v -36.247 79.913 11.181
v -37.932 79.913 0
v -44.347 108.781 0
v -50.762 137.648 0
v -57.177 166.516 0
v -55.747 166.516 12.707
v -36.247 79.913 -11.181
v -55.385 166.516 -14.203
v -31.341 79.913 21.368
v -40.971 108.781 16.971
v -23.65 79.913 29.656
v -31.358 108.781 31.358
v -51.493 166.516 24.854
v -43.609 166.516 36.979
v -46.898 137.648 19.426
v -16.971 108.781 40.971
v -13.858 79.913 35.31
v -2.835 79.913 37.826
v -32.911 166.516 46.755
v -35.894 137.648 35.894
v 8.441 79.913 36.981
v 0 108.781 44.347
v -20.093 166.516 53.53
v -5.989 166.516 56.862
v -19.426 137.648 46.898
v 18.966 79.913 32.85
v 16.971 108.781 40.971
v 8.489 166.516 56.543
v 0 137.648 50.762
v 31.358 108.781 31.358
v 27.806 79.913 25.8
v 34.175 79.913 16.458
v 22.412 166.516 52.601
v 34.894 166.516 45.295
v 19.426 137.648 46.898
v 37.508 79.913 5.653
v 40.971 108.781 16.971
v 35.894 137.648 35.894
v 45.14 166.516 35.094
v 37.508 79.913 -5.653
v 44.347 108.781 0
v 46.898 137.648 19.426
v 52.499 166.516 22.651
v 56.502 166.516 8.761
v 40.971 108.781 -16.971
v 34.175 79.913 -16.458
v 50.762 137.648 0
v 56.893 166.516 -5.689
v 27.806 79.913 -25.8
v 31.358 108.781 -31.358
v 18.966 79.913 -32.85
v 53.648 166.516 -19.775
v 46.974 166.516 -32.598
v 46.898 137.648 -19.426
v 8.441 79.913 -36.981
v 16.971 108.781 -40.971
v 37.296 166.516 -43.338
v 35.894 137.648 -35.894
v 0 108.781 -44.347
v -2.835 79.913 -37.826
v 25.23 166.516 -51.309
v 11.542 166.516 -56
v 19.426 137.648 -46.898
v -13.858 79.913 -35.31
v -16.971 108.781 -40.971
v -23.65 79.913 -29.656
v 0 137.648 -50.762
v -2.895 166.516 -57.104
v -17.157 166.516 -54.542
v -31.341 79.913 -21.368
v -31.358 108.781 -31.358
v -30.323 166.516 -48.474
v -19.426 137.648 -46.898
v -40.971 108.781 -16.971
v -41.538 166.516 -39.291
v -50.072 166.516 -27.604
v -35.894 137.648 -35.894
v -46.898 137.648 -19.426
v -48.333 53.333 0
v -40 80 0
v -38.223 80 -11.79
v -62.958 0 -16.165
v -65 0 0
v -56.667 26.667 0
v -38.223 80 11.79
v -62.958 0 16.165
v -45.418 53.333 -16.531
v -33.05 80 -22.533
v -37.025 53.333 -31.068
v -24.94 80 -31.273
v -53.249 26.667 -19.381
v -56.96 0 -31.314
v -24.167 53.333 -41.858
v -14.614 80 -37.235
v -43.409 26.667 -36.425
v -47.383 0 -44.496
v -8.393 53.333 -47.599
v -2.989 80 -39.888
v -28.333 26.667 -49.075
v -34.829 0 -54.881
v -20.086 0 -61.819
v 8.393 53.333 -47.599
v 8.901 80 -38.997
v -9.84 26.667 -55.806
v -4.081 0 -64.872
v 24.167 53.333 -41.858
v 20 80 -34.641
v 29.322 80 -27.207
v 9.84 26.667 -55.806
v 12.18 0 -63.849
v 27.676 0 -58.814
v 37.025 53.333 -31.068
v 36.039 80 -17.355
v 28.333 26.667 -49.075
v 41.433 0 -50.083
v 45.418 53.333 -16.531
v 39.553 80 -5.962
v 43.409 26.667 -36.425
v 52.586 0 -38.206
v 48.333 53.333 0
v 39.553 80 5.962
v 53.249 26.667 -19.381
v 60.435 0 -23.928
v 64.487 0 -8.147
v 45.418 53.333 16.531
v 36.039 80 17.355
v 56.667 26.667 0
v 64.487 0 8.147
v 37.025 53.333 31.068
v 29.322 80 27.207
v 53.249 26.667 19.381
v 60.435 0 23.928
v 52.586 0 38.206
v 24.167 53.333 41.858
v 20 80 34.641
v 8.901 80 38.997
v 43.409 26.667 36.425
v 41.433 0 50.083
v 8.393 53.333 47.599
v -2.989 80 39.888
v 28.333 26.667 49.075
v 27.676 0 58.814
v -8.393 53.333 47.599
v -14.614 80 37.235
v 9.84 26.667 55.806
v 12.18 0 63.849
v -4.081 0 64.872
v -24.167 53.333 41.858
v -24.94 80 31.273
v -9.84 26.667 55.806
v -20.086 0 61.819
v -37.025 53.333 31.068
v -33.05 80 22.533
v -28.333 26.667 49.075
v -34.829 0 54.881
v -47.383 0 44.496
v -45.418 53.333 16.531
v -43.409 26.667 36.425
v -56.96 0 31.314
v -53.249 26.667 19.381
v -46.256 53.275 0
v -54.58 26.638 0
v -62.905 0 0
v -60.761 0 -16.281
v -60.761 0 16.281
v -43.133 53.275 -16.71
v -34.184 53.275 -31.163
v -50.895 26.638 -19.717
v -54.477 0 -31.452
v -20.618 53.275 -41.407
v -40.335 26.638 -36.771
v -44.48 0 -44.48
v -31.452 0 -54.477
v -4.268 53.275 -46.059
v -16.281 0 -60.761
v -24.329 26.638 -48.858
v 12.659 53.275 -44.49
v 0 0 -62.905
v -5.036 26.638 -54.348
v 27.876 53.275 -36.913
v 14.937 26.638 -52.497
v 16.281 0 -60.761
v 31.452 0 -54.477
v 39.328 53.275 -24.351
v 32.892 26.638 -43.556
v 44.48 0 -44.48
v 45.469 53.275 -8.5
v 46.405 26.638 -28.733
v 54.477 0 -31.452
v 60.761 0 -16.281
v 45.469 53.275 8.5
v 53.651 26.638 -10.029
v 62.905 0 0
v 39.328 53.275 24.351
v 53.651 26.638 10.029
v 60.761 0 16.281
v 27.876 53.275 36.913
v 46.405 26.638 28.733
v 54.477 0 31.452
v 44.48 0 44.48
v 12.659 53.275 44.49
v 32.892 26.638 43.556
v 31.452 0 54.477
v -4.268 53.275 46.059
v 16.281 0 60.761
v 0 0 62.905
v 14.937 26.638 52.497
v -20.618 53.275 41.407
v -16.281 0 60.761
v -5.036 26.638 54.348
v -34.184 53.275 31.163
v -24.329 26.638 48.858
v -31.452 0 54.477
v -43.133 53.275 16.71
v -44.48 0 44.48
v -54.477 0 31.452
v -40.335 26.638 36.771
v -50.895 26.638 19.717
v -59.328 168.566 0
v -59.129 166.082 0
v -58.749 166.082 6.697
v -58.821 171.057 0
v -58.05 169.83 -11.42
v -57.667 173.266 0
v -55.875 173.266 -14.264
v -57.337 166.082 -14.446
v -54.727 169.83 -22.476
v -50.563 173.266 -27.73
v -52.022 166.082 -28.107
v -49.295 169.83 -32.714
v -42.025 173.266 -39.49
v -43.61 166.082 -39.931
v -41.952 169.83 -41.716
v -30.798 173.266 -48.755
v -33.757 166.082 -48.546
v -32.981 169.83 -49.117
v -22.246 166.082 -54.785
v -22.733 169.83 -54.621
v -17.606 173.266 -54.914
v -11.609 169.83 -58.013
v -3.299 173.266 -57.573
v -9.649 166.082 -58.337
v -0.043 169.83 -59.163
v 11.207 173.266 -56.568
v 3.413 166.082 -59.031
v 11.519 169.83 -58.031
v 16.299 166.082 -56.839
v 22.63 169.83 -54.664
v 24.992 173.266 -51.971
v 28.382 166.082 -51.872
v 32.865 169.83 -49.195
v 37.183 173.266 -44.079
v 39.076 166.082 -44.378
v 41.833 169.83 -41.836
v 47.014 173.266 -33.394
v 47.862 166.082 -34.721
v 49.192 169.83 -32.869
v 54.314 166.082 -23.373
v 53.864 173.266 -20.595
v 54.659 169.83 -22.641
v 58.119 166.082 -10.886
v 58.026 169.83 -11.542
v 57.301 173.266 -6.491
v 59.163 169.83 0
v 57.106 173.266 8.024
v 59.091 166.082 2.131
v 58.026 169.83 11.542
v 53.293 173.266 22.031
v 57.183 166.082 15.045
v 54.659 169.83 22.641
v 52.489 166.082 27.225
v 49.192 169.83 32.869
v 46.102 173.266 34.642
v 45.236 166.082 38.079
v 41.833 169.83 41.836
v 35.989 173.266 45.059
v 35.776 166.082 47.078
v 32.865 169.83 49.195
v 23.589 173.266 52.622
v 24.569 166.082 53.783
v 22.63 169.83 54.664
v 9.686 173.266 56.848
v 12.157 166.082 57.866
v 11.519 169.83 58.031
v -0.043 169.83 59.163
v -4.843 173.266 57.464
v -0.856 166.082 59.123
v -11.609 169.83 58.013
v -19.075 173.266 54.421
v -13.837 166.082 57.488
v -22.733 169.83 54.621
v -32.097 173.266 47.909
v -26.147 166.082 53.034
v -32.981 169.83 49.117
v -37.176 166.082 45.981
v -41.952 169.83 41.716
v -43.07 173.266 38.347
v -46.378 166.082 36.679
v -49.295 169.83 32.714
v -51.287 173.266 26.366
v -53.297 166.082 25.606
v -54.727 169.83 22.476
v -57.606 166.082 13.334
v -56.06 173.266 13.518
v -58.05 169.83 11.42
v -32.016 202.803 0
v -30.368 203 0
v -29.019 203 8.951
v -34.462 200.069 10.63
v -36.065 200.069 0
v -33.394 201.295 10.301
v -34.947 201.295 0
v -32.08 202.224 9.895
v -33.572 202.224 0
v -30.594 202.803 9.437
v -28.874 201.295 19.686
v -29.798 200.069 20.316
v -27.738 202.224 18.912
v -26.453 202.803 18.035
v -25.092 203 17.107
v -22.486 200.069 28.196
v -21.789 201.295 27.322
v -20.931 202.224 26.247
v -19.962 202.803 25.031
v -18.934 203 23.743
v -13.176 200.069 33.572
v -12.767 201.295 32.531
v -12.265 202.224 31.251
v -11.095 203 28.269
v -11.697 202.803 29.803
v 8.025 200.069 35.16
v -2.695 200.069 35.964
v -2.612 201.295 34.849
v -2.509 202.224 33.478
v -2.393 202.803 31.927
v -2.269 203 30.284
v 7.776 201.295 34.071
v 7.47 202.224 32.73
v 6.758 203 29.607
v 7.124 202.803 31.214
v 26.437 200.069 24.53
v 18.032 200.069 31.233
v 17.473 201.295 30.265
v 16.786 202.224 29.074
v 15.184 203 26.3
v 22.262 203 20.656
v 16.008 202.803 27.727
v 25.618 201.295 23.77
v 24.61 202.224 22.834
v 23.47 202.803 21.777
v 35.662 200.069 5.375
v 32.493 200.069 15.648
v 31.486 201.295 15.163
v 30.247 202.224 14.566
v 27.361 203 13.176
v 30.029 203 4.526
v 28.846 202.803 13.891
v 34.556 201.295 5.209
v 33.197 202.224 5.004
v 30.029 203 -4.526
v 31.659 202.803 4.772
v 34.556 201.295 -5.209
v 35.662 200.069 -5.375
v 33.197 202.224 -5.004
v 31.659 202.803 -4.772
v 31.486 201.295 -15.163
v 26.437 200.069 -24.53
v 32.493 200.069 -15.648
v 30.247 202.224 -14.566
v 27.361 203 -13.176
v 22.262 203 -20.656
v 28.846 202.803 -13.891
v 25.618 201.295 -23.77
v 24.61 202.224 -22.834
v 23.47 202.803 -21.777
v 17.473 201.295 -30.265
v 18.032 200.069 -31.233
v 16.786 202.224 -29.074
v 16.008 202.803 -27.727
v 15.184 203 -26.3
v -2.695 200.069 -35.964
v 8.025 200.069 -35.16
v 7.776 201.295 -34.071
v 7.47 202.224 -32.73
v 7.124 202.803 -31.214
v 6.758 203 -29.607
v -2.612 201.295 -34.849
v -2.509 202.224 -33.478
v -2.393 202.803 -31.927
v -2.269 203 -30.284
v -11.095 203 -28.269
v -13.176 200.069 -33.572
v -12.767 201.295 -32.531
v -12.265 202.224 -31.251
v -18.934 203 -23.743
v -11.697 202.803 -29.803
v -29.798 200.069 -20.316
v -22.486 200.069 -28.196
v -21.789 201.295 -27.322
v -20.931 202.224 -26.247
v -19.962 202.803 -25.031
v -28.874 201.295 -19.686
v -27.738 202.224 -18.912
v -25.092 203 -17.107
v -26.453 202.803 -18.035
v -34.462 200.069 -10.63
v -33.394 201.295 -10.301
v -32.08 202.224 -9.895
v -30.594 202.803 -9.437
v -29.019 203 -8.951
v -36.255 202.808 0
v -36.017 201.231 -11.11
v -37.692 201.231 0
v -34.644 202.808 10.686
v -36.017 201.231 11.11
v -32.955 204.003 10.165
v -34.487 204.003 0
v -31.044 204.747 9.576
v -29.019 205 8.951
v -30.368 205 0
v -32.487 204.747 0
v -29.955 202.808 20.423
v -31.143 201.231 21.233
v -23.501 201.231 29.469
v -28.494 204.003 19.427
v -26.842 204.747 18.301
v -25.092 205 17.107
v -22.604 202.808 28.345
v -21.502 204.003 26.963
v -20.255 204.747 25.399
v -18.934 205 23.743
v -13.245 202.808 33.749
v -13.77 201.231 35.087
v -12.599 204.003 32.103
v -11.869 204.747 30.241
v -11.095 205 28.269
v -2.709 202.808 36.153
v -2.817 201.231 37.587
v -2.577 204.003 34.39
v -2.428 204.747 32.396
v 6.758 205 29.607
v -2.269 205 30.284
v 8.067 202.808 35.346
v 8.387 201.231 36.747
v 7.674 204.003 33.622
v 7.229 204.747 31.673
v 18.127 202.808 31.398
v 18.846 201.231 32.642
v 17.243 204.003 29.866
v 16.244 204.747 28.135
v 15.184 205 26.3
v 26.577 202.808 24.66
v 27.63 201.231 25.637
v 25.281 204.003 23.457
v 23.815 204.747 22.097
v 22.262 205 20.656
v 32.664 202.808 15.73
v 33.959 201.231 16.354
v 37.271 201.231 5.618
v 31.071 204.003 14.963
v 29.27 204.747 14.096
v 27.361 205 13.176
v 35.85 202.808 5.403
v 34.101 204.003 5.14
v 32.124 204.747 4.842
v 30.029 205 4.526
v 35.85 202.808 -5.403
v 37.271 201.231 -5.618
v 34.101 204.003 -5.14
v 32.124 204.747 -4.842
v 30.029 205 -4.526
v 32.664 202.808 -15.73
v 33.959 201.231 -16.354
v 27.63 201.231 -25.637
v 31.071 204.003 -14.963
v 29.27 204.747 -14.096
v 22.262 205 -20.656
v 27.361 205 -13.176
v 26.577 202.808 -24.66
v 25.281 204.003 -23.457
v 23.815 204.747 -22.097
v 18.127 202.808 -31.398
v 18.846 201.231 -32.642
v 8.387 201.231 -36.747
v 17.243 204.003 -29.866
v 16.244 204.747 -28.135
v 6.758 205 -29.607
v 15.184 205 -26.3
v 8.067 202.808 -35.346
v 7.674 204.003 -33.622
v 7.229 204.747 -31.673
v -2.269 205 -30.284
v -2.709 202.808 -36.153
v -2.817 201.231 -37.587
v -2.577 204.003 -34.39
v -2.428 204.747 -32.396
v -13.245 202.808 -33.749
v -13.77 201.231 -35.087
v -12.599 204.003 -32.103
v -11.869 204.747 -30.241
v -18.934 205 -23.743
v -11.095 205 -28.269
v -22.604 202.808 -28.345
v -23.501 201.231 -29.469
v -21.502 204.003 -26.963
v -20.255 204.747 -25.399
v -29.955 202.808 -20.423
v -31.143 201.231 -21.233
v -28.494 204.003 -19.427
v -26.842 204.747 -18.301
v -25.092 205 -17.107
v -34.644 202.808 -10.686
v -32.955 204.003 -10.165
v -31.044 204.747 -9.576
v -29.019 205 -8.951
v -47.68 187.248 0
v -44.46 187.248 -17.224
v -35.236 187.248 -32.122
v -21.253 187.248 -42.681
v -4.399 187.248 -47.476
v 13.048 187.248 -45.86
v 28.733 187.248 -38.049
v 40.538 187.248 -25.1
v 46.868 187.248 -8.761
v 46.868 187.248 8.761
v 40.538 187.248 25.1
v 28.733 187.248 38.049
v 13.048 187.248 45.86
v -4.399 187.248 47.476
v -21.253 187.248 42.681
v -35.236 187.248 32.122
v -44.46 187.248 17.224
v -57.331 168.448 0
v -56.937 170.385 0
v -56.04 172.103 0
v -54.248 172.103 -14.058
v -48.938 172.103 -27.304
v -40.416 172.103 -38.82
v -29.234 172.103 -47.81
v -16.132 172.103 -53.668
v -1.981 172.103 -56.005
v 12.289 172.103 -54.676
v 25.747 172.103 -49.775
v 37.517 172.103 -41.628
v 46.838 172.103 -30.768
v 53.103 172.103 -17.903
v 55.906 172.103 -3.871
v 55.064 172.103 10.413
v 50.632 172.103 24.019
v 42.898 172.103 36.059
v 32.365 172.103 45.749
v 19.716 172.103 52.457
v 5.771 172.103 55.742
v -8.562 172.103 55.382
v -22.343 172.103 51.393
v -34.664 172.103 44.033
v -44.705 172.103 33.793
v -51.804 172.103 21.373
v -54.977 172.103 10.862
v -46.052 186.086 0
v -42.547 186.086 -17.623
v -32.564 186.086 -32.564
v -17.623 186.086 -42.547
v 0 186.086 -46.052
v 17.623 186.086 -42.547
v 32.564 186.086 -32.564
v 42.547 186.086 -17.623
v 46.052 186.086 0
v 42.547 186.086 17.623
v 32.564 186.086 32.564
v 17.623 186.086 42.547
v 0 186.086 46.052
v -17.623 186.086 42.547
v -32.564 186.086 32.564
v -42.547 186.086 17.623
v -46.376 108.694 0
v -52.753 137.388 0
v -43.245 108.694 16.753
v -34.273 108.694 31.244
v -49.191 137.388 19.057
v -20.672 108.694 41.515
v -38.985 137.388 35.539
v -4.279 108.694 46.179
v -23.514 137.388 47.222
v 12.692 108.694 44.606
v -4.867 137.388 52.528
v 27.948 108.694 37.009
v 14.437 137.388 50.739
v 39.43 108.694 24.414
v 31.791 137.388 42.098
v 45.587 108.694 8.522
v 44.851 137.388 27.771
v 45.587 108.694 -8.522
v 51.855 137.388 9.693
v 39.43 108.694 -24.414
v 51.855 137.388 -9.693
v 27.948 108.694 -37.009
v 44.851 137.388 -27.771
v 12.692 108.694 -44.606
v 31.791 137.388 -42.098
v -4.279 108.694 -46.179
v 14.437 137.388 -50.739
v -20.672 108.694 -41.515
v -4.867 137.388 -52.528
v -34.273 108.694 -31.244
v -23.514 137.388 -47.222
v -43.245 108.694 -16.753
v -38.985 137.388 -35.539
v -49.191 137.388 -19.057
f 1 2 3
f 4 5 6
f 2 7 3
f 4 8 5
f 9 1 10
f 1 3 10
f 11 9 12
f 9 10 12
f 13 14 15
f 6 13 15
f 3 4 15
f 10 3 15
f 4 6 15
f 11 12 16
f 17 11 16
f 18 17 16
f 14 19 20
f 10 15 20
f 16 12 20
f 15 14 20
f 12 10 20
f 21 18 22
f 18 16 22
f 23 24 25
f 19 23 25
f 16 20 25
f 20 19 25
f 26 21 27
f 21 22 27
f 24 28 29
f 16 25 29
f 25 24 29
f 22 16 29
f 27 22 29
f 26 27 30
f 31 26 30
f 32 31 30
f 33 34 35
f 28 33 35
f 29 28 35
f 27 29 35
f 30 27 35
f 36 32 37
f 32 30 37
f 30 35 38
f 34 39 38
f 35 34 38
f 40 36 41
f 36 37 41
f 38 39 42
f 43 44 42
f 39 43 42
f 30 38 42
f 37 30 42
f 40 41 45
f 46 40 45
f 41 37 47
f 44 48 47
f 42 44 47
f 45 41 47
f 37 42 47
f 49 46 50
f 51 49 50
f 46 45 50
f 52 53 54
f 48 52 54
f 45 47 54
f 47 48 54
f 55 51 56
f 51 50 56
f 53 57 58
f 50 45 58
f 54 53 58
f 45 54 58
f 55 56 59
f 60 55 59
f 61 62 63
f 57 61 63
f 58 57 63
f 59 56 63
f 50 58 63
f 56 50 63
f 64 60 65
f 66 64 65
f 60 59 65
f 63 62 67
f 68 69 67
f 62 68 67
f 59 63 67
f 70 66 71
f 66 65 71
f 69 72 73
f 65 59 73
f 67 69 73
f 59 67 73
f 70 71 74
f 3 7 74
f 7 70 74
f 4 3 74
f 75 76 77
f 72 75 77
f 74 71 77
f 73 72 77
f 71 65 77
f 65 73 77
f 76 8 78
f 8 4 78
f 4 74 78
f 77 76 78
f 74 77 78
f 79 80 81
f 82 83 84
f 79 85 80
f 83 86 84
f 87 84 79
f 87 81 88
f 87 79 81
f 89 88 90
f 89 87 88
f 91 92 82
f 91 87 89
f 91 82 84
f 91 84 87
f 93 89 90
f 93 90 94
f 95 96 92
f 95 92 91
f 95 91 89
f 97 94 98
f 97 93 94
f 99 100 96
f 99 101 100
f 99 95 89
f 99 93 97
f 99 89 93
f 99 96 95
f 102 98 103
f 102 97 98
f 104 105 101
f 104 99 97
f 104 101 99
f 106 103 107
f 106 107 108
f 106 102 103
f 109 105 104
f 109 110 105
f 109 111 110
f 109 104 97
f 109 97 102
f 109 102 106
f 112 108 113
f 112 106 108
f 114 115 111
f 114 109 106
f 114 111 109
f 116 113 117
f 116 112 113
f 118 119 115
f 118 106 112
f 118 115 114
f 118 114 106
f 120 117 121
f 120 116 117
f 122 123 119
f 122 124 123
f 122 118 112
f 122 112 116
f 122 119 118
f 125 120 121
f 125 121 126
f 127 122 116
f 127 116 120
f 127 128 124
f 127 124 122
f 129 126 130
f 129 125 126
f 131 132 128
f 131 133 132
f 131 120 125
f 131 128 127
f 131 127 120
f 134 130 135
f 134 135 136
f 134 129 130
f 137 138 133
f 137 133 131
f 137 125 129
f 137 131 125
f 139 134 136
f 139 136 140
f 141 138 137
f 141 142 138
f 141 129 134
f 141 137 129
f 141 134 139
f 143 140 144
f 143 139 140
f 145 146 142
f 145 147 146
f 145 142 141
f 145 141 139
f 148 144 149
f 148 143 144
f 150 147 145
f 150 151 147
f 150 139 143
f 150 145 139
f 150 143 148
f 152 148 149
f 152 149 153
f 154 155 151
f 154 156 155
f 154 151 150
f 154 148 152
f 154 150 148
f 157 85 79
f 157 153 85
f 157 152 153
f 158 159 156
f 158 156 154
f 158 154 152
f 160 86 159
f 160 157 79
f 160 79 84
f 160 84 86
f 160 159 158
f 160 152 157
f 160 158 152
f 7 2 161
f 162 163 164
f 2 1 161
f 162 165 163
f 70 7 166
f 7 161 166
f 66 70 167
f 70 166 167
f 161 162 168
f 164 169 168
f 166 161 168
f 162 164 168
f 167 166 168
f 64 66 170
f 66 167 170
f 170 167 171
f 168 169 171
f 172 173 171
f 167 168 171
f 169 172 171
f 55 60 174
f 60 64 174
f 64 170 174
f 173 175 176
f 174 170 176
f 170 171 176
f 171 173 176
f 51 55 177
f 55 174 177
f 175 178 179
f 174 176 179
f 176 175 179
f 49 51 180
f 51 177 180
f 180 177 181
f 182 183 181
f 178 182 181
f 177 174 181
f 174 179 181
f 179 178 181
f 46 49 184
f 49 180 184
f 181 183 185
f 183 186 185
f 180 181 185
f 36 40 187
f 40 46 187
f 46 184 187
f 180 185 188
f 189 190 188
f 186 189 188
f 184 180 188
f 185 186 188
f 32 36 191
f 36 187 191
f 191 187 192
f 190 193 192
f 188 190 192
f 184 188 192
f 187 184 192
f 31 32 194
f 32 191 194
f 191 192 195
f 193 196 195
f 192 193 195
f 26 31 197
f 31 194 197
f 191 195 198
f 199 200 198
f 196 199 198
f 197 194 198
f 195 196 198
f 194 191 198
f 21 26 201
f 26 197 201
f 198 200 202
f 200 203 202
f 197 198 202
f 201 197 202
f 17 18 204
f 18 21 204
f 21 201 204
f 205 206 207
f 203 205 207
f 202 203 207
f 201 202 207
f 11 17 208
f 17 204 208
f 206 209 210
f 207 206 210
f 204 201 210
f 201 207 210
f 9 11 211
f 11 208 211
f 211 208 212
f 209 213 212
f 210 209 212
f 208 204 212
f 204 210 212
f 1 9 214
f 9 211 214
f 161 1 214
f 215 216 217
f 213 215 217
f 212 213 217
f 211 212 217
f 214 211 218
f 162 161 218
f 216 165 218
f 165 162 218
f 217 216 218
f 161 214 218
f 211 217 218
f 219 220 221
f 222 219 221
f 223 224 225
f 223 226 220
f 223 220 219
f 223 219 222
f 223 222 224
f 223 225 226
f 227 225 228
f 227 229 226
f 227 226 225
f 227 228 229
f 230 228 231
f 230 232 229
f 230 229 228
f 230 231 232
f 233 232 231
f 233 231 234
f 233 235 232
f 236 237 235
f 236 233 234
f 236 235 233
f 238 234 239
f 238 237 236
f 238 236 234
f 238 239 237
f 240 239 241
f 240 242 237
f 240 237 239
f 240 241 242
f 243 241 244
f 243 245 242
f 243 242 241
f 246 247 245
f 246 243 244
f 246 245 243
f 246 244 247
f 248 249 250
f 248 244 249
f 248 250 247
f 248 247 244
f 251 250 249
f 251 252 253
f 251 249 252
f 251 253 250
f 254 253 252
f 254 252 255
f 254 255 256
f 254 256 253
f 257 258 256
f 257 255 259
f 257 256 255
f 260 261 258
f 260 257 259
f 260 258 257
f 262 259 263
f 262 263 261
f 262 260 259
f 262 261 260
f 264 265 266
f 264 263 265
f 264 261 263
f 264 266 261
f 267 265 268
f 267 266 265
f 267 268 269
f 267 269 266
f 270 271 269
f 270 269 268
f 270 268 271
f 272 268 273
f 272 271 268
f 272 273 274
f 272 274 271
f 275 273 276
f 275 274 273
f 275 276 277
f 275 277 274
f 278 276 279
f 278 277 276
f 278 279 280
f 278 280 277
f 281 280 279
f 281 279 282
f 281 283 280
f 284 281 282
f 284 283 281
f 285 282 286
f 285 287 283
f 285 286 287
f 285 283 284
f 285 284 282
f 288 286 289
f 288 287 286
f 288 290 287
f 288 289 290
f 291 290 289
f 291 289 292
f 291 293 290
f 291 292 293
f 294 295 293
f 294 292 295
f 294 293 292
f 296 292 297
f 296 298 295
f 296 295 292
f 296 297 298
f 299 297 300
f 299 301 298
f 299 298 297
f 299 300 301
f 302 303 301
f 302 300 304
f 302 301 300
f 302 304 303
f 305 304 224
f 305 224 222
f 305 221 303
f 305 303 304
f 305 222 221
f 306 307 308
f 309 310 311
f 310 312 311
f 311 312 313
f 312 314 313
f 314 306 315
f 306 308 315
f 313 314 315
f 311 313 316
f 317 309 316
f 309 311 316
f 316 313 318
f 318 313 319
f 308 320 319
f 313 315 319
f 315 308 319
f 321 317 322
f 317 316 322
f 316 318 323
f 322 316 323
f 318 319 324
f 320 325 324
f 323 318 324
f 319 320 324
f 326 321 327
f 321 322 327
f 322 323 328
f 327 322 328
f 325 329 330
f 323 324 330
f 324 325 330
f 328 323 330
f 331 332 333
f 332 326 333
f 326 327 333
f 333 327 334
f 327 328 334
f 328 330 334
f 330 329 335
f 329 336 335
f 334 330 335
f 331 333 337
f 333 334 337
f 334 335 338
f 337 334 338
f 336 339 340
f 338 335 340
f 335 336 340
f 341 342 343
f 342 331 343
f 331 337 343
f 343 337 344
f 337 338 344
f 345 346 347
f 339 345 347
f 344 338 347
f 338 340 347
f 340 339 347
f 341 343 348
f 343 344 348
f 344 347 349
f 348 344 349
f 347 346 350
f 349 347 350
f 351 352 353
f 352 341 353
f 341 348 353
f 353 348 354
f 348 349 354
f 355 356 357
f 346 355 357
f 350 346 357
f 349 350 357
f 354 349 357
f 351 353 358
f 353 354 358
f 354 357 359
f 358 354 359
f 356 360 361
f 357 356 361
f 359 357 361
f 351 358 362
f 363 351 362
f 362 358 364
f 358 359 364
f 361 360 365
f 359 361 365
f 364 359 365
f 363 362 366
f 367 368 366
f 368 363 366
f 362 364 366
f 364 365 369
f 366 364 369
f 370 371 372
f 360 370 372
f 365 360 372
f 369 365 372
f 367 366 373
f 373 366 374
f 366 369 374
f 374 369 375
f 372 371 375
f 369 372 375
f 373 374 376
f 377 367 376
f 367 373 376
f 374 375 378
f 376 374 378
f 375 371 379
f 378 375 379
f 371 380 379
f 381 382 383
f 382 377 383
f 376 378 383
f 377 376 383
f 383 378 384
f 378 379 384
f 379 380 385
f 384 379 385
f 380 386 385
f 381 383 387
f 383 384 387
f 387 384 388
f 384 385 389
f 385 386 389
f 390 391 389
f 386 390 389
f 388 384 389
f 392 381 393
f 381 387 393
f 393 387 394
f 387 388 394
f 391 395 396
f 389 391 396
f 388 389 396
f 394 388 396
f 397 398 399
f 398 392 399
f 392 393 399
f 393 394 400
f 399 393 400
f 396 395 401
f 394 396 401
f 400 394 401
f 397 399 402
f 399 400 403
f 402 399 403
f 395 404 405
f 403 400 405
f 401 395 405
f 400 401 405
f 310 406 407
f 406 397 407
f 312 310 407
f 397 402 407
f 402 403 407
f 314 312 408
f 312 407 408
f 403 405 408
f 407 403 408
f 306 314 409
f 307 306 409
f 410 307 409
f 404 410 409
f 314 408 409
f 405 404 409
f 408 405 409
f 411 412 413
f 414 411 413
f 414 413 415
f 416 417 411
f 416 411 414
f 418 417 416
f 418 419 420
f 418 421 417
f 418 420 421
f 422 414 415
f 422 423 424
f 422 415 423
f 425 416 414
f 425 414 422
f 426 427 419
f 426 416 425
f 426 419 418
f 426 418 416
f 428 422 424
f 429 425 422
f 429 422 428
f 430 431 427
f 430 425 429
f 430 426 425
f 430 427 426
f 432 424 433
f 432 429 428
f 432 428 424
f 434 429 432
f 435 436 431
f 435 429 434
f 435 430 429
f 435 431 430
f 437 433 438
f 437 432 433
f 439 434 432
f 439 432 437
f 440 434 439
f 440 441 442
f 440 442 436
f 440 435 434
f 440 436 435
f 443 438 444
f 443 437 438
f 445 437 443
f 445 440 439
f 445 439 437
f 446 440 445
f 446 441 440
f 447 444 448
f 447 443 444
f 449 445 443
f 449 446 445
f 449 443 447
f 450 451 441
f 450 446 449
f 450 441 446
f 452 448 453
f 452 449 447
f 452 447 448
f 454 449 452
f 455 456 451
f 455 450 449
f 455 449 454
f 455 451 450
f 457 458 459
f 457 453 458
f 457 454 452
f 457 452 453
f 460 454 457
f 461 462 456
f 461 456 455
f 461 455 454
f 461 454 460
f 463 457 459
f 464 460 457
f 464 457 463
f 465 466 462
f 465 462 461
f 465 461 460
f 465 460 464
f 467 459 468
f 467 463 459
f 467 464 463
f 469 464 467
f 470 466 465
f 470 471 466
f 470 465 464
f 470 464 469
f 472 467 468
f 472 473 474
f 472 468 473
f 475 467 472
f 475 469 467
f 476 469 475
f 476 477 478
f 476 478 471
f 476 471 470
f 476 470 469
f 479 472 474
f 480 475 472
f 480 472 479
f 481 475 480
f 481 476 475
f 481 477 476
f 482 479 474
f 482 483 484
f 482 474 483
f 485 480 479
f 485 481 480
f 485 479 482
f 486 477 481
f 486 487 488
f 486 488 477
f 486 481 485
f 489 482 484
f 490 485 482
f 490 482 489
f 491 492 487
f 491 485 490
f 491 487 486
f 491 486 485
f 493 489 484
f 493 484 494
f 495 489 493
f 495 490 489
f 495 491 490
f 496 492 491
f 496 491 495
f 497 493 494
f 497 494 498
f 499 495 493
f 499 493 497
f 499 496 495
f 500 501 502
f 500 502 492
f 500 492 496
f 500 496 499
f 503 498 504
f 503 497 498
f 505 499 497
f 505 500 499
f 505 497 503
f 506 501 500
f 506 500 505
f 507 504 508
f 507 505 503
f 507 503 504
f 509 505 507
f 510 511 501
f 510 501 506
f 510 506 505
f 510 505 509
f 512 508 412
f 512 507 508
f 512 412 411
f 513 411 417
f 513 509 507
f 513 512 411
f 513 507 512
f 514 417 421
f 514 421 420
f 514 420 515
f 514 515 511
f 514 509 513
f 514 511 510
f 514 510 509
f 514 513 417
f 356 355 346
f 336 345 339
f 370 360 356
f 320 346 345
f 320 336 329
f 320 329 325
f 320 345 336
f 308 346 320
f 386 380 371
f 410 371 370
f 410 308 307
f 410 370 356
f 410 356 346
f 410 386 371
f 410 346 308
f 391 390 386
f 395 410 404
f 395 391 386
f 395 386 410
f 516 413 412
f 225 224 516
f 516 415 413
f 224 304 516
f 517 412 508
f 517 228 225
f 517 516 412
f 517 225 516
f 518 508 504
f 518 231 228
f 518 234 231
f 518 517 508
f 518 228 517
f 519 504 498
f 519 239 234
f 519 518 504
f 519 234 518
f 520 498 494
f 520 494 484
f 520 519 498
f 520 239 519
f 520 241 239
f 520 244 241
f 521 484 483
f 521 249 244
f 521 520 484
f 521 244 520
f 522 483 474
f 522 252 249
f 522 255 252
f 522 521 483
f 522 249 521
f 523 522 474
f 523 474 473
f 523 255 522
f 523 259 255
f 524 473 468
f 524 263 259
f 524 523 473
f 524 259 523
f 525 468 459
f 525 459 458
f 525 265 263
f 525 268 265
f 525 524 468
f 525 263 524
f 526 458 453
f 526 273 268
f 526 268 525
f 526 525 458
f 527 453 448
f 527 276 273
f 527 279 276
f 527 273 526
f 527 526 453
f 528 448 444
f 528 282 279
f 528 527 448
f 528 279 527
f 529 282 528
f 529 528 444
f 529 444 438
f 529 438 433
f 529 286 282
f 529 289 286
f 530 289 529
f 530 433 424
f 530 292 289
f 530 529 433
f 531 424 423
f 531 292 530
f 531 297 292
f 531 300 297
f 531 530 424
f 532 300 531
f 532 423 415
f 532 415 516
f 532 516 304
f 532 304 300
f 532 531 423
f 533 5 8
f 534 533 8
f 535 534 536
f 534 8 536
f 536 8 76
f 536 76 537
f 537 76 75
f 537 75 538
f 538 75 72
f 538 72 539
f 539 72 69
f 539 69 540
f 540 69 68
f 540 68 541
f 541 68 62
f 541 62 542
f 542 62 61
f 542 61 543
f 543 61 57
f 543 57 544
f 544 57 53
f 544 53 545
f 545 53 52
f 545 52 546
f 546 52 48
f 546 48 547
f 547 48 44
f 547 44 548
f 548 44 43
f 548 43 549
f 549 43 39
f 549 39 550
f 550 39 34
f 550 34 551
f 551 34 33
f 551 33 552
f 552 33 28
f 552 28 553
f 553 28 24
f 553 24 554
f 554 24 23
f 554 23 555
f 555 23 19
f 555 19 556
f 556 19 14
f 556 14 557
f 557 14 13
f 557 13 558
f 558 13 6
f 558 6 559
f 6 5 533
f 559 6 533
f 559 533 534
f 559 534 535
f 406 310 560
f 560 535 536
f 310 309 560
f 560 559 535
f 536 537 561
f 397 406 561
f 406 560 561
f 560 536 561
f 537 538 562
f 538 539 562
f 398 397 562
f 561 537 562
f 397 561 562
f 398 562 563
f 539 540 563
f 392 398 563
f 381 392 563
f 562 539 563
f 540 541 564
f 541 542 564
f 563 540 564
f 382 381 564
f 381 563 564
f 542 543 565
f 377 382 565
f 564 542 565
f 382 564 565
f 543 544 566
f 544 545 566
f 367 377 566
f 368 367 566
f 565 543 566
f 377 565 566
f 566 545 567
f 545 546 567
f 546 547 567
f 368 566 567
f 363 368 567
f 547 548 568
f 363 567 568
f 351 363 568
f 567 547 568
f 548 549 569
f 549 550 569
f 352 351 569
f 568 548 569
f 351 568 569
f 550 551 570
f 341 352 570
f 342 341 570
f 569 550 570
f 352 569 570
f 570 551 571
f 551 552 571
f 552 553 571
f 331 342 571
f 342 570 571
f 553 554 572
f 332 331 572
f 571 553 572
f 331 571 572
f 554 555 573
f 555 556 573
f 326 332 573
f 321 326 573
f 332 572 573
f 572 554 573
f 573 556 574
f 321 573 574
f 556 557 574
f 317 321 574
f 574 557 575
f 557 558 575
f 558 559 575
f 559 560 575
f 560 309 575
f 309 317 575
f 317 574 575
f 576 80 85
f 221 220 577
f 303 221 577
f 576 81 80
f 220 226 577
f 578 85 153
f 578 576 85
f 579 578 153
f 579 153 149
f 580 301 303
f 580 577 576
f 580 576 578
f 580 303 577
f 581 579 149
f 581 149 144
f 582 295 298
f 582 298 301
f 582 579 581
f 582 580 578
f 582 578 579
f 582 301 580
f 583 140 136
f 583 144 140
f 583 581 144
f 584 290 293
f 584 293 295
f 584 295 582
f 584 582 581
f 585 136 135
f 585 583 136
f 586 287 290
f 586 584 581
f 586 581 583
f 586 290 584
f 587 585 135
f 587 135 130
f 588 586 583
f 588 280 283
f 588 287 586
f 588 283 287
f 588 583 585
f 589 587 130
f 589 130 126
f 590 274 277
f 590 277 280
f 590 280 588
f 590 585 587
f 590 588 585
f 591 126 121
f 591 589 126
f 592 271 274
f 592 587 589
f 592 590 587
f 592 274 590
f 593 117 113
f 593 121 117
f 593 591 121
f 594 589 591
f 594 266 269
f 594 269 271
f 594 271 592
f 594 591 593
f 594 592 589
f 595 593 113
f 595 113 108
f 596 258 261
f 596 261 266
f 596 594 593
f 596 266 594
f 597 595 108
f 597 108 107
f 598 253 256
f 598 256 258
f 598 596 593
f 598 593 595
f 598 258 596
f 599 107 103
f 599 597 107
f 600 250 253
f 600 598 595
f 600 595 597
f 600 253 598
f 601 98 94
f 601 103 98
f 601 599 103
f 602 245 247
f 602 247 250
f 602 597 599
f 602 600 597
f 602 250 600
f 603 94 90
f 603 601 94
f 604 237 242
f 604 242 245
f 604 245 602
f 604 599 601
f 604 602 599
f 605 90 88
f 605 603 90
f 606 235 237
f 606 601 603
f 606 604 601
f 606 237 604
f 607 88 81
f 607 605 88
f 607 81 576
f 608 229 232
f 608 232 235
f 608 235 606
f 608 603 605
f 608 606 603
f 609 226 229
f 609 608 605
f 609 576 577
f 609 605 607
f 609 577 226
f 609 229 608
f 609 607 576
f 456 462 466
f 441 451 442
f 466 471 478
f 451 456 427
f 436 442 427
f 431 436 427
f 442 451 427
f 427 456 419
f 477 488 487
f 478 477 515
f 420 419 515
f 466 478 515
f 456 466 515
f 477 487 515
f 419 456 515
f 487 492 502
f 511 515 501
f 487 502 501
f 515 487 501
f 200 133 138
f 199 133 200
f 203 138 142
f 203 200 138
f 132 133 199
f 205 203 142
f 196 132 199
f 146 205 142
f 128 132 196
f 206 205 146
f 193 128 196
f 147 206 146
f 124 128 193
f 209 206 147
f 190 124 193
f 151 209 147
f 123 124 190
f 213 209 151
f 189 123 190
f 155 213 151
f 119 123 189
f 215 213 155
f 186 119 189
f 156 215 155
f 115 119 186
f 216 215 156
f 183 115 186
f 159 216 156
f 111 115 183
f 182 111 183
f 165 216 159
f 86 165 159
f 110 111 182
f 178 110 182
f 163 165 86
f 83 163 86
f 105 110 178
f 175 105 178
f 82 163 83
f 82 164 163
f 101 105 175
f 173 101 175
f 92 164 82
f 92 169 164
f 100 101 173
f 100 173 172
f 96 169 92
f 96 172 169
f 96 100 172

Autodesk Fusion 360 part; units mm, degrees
sketch "Esquisse1" plane through (0, 0, 0) normal (0, 0, 1) x (1, 0, 0)
  line L0 (0, 0) -> (-65, 0)
  line L1 (-65, 0) -> (-40, 80)
  line L2 (-40, 80) -> (-60, 170)
  line L3 (-60, 170) -> (-35, 205)
  line L4 (-35, 205) -> (0, 205)
  line L5 (0, 205) -> (0, 0)
  dimension "d1" = 65
  dimension "d3" = 35
  dimension "d4" = 90
  dimension "d5" = 80
  dimension "d6" = 40
  dimension "d7" = 60
  dimension "d8" = 35
revolve "Révolution1" add sketch "Esquisse1" angle 360 about axis through (0, 205, 0) along (0, -1, 0)
fillet "Congé1" radius 9 1 edges at (-55.9396, 170, 21.6969)
fillet "Congé2" radius 9 1 edges at (-32.6315, 205, 12.6565)
shell "Coque1" thickness 2 removed faces 1 at (20.2416, 0, -0.2148)
